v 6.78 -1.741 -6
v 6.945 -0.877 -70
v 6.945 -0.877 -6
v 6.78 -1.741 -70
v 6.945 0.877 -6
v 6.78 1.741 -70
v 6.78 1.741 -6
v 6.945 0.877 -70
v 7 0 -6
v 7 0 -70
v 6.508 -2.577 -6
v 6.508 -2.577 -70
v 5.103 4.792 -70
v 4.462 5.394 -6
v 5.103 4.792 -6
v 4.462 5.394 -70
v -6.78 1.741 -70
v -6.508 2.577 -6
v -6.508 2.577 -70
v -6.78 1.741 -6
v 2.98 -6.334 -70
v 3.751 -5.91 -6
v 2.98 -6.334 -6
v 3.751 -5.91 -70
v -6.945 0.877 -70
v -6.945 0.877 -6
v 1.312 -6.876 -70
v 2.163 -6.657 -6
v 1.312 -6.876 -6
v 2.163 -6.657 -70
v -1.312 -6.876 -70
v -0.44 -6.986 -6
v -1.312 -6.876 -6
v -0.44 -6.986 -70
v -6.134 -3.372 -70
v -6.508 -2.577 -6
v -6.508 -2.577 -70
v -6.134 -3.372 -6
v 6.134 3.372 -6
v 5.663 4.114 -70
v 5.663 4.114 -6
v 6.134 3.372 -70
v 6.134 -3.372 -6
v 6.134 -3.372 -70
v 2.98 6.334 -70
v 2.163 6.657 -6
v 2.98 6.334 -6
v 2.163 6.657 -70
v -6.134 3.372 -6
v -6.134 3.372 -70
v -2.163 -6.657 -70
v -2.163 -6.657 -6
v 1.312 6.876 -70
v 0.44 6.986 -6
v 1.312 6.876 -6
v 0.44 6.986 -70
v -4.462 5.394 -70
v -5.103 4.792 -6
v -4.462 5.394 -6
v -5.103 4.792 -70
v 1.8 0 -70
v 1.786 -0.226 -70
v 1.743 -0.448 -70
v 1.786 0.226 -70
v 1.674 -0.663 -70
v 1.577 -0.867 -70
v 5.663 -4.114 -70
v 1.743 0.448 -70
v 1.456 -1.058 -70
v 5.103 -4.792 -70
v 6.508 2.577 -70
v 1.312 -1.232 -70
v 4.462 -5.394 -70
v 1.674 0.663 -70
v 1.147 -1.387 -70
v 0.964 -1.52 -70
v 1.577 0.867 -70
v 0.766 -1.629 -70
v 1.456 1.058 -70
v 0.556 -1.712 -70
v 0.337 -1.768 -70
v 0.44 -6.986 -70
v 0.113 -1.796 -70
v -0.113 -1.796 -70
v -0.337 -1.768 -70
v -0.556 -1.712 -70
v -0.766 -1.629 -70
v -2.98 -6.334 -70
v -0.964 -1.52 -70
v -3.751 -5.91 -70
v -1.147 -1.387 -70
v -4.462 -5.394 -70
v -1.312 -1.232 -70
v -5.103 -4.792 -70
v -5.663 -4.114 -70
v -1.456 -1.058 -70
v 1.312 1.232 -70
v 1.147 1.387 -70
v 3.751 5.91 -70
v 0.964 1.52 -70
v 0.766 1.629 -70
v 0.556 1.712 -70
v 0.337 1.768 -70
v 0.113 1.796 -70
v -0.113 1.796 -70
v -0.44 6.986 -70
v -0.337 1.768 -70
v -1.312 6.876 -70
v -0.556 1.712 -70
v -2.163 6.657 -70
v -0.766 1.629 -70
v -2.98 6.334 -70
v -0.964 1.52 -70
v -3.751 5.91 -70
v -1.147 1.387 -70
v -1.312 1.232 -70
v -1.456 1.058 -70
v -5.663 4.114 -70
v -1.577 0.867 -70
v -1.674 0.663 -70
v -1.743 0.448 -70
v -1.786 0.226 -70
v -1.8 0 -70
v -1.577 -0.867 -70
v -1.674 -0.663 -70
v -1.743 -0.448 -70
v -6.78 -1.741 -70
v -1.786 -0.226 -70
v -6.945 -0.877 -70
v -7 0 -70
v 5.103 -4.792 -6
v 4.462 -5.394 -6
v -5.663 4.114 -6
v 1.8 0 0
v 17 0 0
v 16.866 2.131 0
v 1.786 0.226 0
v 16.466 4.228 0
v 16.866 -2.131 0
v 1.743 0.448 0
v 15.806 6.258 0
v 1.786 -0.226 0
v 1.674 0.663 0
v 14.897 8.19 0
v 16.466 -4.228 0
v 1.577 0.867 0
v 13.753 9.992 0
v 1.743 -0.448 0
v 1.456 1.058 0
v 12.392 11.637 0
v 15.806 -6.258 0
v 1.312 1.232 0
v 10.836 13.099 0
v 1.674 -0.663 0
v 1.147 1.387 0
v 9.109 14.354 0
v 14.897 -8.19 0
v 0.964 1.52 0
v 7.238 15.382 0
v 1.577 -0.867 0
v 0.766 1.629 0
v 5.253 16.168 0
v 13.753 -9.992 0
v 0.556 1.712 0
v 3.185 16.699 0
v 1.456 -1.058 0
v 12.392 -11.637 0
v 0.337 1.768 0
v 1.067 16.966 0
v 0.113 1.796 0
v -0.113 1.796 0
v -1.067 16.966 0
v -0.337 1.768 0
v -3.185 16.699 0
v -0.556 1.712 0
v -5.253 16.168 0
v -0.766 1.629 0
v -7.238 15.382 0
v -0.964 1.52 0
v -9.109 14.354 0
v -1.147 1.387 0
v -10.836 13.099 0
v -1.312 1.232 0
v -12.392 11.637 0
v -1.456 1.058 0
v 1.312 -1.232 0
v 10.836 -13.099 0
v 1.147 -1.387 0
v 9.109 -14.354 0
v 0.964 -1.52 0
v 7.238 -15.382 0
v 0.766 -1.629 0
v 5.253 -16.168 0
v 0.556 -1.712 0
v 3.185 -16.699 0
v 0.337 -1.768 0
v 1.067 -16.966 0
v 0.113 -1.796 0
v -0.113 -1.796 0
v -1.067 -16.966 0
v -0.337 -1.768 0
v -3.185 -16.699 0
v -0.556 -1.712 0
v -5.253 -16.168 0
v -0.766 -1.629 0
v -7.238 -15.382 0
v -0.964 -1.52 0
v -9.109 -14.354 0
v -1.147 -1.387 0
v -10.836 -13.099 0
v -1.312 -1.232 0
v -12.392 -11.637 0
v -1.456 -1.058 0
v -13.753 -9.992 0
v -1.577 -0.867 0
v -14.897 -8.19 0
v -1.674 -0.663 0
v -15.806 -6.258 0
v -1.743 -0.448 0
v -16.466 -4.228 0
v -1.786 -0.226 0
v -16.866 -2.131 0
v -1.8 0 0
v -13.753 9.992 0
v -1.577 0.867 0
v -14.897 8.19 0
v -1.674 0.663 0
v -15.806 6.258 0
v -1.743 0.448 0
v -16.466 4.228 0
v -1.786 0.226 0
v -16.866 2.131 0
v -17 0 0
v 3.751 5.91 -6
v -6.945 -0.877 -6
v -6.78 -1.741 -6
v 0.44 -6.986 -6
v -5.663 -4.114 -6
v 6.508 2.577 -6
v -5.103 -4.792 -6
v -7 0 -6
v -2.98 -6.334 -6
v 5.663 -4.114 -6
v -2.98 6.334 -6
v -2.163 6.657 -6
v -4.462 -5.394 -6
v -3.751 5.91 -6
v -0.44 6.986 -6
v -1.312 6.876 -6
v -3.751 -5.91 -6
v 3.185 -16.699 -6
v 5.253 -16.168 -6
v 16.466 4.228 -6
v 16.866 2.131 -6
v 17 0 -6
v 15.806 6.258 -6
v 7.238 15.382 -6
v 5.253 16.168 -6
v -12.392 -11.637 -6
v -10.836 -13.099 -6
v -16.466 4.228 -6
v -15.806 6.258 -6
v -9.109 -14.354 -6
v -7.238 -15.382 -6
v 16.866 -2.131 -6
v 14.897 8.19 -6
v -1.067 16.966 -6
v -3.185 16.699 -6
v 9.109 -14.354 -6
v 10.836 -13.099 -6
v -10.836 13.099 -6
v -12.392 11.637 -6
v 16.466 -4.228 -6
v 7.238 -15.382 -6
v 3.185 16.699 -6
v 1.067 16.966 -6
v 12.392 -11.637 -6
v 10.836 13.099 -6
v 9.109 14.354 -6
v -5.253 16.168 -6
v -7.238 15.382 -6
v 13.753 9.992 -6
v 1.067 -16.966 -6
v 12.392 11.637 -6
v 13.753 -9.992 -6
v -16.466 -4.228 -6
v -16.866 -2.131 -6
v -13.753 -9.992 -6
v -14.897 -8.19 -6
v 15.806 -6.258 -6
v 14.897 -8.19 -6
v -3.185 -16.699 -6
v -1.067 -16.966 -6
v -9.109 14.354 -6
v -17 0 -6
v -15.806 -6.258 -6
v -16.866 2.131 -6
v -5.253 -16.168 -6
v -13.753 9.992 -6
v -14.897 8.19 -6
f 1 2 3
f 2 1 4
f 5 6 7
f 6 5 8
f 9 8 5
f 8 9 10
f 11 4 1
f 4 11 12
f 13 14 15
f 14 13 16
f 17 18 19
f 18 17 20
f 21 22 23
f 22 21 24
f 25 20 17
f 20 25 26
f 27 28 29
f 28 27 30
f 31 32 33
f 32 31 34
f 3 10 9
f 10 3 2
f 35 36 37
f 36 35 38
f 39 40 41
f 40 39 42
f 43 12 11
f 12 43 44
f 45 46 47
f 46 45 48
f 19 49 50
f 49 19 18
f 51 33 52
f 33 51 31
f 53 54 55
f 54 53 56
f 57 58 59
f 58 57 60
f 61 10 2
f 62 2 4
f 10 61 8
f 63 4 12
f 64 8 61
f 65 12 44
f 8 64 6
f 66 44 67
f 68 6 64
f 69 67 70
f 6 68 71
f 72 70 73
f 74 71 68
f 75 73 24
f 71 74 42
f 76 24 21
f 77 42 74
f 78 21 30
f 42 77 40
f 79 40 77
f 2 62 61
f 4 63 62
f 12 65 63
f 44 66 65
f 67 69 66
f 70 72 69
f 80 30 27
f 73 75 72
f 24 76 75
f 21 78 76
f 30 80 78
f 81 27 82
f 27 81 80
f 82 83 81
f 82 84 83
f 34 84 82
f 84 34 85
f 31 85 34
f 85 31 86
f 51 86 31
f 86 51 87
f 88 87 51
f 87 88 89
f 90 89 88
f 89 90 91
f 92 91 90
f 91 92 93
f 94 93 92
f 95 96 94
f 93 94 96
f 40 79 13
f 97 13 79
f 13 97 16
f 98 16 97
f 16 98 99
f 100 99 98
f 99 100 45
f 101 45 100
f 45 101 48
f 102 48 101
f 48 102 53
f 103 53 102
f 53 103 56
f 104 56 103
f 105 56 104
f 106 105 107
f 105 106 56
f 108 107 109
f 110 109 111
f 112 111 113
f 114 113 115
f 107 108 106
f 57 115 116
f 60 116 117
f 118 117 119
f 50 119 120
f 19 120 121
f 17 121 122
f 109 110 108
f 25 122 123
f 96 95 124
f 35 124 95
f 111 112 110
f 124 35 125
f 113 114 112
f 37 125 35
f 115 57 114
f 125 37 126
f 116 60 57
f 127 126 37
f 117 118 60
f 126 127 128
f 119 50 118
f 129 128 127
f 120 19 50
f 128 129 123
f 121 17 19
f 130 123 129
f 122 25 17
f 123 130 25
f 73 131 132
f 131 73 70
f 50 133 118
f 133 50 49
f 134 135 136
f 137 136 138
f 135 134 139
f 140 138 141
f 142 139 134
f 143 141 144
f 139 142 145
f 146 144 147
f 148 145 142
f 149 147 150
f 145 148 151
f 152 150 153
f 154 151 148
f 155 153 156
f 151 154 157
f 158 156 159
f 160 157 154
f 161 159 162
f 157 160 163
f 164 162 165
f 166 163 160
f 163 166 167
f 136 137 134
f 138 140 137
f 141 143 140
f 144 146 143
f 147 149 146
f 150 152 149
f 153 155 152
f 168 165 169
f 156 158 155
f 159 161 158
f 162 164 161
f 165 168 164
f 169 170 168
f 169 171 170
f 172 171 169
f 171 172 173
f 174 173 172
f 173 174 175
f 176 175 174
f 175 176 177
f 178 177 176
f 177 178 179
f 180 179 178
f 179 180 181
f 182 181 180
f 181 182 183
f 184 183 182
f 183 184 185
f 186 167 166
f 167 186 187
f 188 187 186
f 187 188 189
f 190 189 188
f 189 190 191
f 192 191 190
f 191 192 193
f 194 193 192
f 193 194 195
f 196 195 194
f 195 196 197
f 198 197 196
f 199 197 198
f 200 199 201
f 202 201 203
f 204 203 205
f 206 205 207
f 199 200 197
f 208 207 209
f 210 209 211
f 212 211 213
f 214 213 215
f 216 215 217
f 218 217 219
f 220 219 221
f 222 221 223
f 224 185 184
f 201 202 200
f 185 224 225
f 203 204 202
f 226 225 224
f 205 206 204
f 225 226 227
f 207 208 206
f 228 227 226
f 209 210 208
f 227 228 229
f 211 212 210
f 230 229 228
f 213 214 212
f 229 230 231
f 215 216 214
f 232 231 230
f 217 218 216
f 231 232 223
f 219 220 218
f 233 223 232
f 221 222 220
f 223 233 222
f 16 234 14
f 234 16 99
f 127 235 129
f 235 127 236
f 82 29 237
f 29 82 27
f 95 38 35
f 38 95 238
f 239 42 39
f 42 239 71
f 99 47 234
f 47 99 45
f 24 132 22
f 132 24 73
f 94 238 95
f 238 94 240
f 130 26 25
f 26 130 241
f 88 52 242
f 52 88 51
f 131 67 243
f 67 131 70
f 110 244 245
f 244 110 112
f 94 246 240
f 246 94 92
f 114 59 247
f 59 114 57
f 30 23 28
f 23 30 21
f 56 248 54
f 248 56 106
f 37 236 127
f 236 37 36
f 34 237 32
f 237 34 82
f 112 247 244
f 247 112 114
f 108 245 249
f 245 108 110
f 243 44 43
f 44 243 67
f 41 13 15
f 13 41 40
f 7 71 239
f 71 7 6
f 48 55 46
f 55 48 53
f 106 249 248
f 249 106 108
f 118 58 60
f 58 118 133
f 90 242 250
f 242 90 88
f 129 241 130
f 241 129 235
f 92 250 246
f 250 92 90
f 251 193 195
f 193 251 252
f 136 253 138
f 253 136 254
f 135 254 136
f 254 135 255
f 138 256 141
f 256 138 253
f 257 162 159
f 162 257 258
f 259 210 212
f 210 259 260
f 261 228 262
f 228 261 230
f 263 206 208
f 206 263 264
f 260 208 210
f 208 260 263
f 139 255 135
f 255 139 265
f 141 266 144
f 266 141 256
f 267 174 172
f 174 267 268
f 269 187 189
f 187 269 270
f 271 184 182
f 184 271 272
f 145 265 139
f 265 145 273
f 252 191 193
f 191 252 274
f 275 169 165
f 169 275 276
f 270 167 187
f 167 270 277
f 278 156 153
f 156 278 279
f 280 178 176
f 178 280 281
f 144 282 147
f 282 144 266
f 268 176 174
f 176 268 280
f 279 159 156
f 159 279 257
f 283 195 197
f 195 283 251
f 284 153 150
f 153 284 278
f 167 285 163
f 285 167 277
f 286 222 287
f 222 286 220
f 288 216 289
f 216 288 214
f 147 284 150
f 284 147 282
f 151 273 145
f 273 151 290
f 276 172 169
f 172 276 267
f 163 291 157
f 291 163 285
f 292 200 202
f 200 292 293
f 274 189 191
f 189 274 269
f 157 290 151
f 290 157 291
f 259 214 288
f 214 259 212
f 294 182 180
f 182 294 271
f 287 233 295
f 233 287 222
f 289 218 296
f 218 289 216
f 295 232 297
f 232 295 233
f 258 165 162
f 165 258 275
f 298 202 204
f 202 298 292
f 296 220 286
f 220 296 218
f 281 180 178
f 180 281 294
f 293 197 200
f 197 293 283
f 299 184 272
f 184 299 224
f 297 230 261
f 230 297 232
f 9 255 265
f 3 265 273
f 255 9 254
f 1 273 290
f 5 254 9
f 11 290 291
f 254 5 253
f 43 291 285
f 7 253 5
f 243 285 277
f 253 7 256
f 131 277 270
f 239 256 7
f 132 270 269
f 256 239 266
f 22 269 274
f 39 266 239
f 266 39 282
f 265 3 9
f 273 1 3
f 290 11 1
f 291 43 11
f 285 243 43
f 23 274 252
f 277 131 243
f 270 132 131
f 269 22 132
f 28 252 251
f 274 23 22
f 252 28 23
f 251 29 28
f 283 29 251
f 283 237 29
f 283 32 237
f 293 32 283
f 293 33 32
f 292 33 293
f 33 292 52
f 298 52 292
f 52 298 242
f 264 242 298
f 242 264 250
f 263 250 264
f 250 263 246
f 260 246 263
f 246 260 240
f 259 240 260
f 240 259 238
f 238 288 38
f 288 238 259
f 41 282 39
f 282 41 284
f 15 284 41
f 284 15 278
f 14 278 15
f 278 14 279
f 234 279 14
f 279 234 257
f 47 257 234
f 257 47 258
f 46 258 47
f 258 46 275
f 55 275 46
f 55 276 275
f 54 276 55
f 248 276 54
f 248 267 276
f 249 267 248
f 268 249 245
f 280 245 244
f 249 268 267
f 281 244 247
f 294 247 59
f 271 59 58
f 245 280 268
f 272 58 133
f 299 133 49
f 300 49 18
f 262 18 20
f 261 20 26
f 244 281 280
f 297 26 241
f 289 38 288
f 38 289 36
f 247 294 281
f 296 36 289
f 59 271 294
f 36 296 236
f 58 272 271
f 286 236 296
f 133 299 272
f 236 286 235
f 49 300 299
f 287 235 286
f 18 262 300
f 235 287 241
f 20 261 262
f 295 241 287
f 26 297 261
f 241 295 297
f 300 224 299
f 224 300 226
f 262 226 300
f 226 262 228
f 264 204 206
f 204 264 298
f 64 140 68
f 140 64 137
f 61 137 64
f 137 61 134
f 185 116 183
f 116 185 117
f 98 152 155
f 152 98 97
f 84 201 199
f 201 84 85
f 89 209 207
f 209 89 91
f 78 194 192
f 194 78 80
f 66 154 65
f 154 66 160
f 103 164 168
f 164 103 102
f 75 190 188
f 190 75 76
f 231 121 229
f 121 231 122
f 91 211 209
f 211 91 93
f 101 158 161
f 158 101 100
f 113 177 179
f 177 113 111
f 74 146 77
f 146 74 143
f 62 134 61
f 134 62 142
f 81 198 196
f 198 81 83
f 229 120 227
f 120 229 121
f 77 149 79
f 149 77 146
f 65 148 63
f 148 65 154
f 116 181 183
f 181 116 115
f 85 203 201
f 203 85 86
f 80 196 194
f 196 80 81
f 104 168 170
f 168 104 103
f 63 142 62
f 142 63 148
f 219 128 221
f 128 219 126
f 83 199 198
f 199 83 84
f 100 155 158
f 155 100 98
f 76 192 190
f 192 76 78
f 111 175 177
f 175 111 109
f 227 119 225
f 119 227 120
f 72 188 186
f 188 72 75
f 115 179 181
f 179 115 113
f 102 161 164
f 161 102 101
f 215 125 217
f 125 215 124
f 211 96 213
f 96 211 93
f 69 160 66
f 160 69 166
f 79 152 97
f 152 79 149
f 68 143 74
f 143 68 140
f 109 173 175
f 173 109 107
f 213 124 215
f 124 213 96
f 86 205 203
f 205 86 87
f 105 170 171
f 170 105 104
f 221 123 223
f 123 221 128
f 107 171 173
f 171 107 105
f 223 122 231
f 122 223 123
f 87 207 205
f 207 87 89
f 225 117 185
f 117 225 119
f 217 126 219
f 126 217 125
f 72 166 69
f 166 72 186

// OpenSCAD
$fn = 50;


difference() {
	union() {
		translate(v = [0, 0, -70.0000000000]) {
			cylinder(h = 70, r = 7.0000000000);
		}
		translate(v = [0, 0, -6.0000000000]) {
			cylinder(h = 6, r = 17.0000000000);
		}
	}
	union() {
		#translate(v = [0, 0, -70]) {
			cylinder(h = 70, r = 1.8000000000);
		}
	}
}
